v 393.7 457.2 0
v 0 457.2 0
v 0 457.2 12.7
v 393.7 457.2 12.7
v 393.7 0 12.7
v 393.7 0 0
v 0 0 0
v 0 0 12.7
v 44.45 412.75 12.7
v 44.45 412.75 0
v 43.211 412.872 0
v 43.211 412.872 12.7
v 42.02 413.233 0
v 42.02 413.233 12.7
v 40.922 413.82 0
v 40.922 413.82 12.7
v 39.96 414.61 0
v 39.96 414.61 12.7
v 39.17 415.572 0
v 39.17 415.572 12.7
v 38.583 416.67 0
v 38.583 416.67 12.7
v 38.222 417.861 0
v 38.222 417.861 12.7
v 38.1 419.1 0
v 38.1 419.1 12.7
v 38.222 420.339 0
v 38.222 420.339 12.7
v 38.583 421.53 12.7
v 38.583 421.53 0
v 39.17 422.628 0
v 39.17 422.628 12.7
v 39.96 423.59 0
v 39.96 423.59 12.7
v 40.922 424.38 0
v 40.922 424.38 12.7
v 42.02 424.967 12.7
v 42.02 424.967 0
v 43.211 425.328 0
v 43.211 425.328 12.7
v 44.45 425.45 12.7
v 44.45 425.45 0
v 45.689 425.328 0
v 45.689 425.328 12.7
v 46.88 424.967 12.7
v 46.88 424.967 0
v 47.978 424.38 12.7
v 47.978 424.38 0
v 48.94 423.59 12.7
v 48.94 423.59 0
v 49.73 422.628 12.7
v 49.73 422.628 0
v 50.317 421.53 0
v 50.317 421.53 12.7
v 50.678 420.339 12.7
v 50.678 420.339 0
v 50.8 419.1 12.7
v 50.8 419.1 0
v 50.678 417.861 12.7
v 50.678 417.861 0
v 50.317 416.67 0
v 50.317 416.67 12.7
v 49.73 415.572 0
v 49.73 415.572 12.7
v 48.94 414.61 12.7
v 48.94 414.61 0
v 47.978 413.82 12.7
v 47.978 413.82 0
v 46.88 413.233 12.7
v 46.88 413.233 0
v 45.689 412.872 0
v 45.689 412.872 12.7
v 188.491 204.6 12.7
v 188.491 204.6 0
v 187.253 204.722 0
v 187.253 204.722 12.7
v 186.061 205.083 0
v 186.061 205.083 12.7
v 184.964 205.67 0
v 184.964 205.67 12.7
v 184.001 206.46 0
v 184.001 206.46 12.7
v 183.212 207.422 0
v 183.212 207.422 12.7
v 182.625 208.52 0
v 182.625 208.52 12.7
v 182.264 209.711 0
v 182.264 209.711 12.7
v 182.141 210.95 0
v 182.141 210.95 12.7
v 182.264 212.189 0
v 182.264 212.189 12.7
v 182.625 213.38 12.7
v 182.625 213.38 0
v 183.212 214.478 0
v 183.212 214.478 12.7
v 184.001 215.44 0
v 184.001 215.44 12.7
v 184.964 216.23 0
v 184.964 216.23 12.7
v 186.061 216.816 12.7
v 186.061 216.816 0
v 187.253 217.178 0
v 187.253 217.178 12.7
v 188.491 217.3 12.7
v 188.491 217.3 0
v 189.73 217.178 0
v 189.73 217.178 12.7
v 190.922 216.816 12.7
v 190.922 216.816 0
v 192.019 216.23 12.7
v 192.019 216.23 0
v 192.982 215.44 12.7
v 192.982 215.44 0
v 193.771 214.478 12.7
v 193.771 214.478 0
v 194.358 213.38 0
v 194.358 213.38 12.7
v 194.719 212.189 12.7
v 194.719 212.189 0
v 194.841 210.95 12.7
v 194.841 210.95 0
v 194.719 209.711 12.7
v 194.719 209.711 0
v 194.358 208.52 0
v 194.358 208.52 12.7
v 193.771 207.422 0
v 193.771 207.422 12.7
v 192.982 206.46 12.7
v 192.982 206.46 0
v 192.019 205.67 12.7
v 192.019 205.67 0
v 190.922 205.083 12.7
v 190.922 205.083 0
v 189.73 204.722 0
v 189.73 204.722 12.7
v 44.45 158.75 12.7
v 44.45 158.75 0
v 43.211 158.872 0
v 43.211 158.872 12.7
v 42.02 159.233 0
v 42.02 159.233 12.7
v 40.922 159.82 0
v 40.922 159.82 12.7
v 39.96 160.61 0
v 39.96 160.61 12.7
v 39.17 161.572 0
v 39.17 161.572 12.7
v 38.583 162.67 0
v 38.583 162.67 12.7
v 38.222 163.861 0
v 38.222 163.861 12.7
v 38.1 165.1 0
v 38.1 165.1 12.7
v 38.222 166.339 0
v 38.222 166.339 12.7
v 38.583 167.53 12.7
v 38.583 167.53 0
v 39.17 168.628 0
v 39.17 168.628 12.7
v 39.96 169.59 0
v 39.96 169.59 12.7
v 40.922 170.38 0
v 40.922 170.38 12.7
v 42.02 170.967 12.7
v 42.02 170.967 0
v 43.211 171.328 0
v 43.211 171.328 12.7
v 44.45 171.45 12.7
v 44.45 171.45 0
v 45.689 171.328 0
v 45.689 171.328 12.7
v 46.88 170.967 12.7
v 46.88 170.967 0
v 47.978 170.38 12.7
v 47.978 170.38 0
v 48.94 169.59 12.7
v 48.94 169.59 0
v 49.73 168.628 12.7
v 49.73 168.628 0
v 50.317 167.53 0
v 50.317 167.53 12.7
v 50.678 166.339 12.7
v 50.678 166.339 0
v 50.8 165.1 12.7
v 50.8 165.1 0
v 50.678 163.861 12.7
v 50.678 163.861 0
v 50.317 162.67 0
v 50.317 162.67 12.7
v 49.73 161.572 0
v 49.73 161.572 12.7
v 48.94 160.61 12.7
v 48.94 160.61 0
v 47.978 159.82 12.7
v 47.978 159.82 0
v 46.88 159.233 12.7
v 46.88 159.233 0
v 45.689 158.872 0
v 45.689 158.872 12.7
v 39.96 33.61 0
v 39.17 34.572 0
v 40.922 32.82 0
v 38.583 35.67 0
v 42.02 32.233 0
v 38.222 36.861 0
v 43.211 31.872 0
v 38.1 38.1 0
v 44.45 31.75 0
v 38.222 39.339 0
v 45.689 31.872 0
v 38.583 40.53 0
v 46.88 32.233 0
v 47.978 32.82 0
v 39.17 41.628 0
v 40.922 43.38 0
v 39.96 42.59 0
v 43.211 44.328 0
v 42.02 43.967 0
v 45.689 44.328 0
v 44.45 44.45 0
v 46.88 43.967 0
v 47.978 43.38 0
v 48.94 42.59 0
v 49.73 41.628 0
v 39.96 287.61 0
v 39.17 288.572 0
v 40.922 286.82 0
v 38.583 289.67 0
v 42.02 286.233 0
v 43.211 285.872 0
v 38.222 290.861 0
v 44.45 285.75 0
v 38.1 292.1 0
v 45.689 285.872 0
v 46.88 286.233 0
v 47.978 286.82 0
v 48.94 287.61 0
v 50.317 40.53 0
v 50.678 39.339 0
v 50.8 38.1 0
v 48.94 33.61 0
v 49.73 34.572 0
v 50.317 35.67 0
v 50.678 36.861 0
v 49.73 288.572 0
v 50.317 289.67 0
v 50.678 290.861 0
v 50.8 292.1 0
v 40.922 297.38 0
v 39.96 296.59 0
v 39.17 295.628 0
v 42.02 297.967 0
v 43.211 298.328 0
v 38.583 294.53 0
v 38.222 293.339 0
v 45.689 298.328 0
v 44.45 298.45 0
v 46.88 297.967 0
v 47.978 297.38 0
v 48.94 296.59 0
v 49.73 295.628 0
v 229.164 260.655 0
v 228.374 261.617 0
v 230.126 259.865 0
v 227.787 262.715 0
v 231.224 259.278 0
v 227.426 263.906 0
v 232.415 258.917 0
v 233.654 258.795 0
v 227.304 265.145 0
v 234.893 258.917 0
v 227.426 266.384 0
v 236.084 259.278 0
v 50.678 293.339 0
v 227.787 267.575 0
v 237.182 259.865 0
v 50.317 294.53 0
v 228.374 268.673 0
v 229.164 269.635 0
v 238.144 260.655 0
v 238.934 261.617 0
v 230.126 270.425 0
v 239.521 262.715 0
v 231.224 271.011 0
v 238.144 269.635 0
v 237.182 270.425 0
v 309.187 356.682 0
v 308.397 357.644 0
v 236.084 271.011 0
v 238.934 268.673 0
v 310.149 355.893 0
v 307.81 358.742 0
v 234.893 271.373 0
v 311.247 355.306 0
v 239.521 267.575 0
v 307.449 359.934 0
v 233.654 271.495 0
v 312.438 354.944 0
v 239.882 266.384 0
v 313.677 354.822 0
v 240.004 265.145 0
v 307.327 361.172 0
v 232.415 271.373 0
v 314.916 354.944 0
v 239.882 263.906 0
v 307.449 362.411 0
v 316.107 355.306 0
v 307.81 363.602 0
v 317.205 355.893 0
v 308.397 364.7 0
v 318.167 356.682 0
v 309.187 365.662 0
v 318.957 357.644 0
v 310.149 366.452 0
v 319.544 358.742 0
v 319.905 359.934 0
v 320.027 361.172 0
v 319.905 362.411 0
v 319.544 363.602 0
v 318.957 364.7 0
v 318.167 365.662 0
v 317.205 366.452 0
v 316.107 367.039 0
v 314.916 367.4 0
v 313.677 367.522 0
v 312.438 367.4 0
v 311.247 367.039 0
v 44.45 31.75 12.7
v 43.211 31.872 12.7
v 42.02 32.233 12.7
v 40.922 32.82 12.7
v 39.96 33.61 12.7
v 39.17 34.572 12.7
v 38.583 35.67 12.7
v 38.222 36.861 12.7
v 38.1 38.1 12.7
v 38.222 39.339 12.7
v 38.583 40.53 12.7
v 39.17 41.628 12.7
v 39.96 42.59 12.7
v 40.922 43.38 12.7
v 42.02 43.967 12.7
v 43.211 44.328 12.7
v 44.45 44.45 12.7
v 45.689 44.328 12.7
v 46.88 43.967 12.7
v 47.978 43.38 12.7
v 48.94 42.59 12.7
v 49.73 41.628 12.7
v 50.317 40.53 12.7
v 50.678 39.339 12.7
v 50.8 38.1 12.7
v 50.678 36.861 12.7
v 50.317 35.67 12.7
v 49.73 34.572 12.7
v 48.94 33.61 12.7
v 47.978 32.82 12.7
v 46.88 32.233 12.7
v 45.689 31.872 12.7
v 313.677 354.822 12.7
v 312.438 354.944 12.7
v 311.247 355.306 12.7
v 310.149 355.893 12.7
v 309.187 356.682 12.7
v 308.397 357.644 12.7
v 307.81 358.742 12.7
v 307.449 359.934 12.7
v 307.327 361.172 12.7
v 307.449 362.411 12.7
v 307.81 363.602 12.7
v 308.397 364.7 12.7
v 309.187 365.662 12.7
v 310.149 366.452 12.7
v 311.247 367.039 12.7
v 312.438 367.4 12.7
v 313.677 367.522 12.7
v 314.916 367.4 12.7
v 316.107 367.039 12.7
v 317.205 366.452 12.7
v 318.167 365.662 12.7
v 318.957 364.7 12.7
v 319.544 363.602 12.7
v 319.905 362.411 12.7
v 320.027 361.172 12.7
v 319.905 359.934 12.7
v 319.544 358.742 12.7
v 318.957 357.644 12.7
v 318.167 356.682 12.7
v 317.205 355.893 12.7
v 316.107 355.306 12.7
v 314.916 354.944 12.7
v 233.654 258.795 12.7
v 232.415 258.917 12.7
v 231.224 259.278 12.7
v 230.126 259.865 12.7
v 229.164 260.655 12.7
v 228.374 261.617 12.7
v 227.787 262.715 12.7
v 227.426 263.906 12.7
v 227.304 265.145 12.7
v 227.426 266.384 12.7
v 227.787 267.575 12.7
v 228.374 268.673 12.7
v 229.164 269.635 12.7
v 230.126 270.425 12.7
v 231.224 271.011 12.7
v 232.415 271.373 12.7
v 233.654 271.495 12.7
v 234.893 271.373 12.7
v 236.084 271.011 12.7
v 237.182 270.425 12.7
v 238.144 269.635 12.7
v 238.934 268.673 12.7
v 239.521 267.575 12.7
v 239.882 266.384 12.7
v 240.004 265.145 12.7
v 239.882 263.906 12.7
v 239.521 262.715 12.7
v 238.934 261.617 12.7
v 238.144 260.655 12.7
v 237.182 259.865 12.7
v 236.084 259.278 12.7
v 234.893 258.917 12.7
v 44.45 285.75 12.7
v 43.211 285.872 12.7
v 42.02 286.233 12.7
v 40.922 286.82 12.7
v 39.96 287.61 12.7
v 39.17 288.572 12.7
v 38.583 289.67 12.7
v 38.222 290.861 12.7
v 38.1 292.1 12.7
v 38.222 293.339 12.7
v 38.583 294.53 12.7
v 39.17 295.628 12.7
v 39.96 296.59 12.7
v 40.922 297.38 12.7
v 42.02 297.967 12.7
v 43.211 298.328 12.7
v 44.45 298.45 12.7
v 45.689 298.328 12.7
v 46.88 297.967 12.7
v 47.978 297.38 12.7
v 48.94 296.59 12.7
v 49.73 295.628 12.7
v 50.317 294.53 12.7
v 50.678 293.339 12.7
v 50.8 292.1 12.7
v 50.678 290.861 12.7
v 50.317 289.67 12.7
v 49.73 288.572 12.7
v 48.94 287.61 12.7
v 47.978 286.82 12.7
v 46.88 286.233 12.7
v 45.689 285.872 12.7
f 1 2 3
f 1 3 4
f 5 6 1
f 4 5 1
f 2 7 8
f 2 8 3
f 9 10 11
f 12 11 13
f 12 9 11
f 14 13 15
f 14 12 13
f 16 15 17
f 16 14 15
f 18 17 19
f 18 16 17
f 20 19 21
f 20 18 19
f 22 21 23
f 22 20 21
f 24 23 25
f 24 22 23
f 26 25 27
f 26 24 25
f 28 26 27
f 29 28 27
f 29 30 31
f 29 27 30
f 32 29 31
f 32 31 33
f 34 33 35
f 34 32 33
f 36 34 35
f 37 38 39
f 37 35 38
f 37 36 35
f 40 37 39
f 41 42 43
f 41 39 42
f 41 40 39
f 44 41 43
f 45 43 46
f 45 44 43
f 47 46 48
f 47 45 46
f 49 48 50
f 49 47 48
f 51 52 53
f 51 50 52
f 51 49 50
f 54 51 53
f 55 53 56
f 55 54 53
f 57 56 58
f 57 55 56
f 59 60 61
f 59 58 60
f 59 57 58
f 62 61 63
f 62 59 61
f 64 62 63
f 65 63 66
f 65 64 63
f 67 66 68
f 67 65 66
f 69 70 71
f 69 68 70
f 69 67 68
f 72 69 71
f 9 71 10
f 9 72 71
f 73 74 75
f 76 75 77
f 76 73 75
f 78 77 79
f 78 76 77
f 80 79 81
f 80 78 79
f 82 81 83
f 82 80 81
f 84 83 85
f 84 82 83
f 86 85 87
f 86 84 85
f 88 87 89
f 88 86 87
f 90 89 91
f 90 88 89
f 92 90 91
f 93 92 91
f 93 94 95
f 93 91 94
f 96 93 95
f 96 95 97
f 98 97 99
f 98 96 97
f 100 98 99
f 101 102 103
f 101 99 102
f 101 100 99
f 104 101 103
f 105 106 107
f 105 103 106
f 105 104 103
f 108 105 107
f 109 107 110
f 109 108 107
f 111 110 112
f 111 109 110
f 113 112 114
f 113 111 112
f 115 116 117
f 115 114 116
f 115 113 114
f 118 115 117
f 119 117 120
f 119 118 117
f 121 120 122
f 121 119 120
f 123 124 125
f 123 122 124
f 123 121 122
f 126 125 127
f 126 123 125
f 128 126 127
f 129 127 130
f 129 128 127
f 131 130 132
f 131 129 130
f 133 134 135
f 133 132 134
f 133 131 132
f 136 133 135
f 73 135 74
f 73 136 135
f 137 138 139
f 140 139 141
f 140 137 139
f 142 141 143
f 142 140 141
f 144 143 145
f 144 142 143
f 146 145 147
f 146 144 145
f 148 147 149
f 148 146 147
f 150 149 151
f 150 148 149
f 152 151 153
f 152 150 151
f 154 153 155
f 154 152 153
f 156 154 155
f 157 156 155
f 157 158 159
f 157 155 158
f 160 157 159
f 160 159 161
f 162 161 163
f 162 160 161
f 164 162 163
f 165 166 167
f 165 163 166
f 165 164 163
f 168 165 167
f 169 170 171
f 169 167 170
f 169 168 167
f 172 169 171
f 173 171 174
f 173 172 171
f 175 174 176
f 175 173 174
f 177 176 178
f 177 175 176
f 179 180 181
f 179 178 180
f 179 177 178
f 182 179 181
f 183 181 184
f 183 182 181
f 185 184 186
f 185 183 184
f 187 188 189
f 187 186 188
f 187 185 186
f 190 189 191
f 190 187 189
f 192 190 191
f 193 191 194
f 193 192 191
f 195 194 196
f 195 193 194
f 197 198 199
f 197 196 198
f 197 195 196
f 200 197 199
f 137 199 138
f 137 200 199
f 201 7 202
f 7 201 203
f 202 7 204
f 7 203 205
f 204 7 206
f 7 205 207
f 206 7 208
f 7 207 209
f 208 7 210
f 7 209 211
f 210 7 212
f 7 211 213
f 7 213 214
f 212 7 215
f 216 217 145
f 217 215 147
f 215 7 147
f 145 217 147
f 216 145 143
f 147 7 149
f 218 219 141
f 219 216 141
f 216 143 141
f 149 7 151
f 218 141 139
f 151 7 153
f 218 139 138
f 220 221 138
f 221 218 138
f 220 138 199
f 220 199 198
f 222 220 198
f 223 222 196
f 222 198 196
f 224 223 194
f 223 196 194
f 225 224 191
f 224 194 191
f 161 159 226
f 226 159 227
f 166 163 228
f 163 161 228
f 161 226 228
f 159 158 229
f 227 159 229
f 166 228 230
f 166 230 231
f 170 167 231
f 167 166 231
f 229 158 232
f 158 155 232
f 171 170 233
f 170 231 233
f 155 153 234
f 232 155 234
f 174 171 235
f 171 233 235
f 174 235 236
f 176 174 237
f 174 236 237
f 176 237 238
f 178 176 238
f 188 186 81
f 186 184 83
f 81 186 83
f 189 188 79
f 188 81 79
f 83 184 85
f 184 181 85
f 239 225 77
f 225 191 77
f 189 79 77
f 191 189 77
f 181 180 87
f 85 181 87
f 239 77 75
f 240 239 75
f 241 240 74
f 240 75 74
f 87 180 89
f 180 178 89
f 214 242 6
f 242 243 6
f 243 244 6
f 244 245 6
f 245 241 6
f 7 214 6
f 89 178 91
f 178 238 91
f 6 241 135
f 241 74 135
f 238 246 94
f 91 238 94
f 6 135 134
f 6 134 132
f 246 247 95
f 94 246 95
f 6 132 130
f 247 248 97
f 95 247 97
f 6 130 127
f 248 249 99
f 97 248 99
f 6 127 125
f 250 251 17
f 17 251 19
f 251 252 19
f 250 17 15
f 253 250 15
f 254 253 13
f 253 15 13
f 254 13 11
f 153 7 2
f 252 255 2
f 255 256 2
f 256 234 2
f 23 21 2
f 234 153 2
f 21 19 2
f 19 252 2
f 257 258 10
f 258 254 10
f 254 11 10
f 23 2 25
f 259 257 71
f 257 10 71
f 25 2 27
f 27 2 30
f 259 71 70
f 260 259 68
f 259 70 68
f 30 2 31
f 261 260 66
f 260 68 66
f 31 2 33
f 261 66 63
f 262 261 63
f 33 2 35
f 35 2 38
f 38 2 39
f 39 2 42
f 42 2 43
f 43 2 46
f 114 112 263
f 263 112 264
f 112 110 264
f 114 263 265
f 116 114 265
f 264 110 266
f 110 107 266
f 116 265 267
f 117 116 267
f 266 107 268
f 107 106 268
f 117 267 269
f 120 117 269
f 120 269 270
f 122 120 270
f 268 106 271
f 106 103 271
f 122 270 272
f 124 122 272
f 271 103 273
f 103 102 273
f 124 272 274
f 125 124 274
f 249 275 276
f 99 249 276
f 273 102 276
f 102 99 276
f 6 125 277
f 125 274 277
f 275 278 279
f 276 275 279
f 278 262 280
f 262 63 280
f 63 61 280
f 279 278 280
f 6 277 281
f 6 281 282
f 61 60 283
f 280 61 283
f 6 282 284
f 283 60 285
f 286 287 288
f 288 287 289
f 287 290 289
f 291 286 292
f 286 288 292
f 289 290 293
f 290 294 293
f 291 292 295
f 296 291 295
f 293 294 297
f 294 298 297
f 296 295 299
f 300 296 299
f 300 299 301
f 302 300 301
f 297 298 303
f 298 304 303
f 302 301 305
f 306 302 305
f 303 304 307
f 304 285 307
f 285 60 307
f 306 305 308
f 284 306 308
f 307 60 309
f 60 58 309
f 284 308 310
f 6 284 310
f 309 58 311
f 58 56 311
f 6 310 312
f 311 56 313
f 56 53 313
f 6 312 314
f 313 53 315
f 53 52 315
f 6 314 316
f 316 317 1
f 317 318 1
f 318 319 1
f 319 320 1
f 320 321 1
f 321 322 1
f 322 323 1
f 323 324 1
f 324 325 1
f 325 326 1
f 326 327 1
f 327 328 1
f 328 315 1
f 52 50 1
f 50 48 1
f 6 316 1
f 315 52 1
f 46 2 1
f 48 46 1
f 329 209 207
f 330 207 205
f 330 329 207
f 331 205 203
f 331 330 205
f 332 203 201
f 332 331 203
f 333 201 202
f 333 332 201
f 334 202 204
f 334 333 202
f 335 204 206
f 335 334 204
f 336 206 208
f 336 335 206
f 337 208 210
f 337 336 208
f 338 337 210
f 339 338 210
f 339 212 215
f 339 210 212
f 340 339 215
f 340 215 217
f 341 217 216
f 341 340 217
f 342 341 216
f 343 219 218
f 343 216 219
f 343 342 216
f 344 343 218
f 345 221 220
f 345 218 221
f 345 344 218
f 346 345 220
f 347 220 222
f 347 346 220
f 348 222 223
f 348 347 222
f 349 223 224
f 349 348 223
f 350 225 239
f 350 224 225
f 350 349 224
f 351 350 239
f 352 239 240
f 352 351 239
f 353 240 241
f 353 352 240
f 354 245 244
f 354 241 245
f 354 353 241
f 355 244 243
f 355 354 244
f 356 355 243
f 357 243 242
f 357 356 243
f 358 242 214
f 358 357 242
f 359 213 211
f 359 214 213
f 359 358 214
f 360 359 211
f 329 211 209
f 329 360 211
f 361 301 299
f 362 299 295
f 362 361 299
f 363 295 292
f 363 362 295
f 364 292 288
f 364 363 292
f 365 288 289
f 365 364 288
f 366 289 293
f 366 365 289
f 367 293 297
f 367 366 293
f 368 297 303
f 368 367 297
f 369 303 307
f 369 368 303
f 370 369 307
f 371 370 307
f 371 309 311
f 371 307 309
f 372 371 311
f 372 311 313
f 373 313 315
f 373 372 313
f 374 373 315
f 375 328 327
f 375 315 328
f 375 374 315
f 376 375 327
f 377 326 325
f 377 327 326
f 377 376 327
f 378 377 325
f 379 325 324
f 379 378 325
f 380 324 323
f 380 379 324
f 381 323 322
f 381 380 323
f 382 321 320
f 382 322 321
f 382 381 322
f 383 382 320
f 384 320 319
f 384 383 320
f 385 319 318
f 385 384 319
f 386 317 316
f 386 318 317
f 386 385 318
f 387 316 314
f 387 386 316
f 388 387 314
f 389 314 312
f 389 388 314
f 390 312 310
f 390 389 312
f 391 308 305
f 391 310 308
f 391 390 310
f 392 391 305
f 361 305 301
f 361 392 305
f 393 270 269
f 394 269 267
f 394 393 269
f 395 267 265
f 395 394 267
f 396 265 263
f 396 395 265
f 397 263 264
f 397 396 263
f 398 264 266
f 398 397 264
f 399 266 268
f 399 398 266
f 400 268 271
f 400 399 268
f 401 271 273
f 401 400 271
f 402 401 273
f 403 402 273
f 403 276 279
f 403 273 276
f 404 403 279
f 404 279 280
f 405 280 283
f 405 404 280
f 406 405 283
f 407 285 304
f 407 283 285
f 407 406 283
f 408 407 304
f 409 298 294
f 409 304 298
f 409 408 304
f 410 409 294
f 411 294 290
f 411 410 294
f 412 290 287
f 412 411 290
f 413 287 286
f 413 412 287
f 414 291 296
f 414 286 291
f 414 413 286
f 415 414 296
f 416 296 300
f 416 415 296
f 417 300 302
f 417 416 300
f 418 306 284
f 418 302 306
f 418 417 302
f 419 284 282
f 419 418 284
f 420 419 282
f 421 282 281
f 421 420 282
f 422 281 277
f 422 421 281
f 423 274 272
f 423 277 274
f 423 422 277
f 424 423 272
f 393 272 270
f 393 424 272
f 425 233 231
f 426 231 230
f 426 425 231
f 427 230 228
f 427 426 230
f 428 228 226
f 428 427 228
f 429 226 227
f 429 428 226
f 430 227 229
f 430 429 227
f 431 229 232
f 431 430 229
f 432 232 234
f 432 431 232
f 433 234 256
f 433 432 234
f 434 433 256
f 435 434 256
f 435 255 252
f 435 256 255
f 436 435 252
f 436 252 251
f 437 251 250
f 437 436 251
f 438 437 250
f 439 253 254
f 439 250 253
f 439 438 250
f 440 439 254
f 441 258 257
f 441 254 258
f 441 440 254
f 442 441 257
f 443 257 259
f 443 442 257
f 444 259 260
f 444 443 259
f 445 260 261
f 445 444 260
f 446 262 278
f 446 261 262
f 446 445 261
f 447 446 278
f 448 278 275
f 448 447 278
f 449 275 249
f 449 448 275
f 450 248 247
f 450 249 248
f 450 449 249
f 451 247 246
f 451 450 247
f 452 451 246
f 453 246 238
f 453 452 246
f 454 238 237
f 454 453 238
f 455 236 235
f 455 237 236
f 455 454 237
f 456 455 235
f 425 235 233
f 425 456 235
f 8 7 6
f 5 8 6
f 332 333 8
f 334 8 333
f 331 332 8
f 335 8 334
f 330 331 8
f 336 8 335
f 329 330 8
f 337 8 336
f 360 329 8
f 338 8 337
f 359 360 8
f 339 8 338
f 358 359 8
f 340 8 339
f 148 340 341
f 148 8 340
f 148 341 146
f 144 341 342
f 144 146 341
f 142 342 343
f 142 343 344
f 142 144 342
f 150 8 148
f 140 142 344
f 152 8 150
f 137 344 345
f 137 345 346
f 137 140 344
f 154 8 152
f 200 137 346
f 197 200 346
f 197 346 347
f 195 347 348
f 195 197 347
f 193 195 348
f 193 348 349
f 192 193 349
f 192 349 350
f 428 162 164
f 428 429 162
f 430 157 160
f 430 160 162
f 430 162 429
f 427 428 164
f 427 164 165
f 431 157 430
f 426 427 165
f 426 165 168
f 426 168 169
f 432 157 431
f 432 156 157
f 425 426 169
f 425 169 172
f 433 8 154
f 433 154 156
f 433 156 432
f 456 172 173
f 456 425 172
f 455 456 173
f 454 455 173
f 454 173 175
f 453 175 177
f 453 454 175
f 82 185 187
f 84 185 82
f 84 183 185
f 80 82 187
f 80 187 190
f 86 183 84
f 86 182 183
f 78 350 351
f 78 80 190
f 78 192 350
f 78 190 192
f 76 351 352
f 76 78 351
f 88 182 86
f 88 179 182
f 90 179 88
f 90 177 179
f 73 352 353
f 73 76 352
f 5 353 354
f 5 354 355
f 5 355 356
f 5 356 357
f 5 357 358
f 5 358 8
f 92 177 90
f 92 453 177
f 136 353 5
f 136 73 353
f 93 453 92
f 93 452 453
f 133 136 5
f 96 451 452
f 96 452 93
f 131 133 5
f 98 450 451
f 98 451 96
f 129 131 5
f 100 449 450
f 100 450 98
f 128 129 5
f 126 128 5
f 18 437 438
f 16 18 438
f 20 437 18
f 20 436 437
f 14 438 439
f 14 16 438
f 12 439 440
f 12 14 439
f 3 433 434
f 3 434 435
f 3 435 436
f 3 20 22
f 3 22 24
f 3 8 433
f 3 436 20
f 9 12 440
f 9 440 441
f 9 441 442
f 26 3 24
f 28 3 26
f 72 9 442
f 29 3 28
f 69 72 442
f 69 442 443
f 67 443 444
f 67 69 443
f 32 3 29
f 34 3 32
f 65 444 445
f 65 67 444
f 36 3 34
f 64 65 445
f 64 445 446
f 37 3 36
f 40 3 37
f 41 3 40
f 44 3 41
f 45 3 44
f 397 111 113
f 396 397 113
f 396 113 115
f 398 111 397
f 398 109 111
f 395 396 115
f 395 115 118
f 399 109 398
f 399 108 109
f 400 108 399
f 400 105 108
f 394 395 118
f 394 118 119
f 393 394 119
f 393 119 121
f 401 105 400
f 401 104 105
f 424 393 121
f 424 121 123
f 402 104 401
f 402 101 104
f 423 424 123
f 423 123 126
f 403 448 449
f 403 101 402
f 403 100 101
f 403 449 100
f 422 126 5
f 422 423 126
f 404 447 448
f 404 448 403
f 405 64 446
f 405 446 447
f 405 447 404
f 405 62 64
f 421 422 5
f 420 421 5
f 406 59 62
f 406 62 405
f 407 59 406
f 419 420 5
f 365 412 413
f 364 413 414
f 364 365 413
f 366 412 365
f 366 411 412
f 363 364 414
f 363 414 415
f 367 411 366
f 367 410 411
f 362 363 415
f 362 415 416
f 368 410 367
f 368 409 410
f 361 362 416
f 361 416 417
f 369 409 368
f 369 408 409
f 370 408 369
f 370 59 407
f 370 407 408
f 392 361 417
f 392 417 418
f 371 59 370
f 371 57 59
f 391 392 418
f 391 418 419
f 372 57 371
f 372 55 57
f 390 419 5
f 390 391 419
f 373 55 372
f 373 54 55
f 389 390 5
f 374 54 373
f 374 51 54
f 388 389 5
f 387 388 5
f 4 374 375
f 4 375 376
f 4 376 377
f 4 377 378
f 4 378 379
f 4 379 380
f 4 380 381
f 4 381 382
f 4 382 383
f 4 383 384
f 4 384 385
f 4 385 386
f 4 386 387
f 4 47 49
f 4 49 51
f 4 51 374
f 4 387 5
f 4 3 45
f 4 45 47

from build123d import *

# Parameters (mm, degrees)
SKETCH1_W             = 393.7
SKETCH1_H             = 457.2
PLATE_DEPTH           = 12.7
STANDARD_LINEAR_COUNT = 4
STANDARD_LINEAR_PITCH = 127


with BuildPart() as part:
    # Sketch1 → Plate (new body)
    with BuildSketch(Plane.XY):
        with Locations((196.85, 228.6)):
            Rectangle(SKETCH1_W, SKETCH1_H)
    extrude(amount=PLATE_DEPTH)

    # Sketch3 → Hole (revolve, cut)
    with BuildSketch(Plane(origin=(44.45, 38.1, 12.7), x_dir=(0, -1, 0), z_dir=(1, 0, 0))):
        Polygon((0, 0), (0, 29.215464931), (6.35, 25.4), (6.35, 0), align=None)
    hole = revolve(axis=Axis((44.45, 38.1, 19.05), (0, 0, -1)), mode=Mode.SUBTRACT)

    # Standard Linear: Hole ×4
    with Locations(*[(0, i * STANDARD_LINEAR_PITCH, 0) for i in range(1, STANDARD_LINEAR_COUNT)]):
        add(hole, mode=Mode.SUBTRACT)

    # Sketch-Pattern1: Hole at 3 more places
    with Locations((189.2039, 227.04468, 0), (269.22695, 323.07234, 0), (144.04149, 172.849788, 0)):
        add(hole, mode=Mode.SUBTRACT)


solid = part.part
